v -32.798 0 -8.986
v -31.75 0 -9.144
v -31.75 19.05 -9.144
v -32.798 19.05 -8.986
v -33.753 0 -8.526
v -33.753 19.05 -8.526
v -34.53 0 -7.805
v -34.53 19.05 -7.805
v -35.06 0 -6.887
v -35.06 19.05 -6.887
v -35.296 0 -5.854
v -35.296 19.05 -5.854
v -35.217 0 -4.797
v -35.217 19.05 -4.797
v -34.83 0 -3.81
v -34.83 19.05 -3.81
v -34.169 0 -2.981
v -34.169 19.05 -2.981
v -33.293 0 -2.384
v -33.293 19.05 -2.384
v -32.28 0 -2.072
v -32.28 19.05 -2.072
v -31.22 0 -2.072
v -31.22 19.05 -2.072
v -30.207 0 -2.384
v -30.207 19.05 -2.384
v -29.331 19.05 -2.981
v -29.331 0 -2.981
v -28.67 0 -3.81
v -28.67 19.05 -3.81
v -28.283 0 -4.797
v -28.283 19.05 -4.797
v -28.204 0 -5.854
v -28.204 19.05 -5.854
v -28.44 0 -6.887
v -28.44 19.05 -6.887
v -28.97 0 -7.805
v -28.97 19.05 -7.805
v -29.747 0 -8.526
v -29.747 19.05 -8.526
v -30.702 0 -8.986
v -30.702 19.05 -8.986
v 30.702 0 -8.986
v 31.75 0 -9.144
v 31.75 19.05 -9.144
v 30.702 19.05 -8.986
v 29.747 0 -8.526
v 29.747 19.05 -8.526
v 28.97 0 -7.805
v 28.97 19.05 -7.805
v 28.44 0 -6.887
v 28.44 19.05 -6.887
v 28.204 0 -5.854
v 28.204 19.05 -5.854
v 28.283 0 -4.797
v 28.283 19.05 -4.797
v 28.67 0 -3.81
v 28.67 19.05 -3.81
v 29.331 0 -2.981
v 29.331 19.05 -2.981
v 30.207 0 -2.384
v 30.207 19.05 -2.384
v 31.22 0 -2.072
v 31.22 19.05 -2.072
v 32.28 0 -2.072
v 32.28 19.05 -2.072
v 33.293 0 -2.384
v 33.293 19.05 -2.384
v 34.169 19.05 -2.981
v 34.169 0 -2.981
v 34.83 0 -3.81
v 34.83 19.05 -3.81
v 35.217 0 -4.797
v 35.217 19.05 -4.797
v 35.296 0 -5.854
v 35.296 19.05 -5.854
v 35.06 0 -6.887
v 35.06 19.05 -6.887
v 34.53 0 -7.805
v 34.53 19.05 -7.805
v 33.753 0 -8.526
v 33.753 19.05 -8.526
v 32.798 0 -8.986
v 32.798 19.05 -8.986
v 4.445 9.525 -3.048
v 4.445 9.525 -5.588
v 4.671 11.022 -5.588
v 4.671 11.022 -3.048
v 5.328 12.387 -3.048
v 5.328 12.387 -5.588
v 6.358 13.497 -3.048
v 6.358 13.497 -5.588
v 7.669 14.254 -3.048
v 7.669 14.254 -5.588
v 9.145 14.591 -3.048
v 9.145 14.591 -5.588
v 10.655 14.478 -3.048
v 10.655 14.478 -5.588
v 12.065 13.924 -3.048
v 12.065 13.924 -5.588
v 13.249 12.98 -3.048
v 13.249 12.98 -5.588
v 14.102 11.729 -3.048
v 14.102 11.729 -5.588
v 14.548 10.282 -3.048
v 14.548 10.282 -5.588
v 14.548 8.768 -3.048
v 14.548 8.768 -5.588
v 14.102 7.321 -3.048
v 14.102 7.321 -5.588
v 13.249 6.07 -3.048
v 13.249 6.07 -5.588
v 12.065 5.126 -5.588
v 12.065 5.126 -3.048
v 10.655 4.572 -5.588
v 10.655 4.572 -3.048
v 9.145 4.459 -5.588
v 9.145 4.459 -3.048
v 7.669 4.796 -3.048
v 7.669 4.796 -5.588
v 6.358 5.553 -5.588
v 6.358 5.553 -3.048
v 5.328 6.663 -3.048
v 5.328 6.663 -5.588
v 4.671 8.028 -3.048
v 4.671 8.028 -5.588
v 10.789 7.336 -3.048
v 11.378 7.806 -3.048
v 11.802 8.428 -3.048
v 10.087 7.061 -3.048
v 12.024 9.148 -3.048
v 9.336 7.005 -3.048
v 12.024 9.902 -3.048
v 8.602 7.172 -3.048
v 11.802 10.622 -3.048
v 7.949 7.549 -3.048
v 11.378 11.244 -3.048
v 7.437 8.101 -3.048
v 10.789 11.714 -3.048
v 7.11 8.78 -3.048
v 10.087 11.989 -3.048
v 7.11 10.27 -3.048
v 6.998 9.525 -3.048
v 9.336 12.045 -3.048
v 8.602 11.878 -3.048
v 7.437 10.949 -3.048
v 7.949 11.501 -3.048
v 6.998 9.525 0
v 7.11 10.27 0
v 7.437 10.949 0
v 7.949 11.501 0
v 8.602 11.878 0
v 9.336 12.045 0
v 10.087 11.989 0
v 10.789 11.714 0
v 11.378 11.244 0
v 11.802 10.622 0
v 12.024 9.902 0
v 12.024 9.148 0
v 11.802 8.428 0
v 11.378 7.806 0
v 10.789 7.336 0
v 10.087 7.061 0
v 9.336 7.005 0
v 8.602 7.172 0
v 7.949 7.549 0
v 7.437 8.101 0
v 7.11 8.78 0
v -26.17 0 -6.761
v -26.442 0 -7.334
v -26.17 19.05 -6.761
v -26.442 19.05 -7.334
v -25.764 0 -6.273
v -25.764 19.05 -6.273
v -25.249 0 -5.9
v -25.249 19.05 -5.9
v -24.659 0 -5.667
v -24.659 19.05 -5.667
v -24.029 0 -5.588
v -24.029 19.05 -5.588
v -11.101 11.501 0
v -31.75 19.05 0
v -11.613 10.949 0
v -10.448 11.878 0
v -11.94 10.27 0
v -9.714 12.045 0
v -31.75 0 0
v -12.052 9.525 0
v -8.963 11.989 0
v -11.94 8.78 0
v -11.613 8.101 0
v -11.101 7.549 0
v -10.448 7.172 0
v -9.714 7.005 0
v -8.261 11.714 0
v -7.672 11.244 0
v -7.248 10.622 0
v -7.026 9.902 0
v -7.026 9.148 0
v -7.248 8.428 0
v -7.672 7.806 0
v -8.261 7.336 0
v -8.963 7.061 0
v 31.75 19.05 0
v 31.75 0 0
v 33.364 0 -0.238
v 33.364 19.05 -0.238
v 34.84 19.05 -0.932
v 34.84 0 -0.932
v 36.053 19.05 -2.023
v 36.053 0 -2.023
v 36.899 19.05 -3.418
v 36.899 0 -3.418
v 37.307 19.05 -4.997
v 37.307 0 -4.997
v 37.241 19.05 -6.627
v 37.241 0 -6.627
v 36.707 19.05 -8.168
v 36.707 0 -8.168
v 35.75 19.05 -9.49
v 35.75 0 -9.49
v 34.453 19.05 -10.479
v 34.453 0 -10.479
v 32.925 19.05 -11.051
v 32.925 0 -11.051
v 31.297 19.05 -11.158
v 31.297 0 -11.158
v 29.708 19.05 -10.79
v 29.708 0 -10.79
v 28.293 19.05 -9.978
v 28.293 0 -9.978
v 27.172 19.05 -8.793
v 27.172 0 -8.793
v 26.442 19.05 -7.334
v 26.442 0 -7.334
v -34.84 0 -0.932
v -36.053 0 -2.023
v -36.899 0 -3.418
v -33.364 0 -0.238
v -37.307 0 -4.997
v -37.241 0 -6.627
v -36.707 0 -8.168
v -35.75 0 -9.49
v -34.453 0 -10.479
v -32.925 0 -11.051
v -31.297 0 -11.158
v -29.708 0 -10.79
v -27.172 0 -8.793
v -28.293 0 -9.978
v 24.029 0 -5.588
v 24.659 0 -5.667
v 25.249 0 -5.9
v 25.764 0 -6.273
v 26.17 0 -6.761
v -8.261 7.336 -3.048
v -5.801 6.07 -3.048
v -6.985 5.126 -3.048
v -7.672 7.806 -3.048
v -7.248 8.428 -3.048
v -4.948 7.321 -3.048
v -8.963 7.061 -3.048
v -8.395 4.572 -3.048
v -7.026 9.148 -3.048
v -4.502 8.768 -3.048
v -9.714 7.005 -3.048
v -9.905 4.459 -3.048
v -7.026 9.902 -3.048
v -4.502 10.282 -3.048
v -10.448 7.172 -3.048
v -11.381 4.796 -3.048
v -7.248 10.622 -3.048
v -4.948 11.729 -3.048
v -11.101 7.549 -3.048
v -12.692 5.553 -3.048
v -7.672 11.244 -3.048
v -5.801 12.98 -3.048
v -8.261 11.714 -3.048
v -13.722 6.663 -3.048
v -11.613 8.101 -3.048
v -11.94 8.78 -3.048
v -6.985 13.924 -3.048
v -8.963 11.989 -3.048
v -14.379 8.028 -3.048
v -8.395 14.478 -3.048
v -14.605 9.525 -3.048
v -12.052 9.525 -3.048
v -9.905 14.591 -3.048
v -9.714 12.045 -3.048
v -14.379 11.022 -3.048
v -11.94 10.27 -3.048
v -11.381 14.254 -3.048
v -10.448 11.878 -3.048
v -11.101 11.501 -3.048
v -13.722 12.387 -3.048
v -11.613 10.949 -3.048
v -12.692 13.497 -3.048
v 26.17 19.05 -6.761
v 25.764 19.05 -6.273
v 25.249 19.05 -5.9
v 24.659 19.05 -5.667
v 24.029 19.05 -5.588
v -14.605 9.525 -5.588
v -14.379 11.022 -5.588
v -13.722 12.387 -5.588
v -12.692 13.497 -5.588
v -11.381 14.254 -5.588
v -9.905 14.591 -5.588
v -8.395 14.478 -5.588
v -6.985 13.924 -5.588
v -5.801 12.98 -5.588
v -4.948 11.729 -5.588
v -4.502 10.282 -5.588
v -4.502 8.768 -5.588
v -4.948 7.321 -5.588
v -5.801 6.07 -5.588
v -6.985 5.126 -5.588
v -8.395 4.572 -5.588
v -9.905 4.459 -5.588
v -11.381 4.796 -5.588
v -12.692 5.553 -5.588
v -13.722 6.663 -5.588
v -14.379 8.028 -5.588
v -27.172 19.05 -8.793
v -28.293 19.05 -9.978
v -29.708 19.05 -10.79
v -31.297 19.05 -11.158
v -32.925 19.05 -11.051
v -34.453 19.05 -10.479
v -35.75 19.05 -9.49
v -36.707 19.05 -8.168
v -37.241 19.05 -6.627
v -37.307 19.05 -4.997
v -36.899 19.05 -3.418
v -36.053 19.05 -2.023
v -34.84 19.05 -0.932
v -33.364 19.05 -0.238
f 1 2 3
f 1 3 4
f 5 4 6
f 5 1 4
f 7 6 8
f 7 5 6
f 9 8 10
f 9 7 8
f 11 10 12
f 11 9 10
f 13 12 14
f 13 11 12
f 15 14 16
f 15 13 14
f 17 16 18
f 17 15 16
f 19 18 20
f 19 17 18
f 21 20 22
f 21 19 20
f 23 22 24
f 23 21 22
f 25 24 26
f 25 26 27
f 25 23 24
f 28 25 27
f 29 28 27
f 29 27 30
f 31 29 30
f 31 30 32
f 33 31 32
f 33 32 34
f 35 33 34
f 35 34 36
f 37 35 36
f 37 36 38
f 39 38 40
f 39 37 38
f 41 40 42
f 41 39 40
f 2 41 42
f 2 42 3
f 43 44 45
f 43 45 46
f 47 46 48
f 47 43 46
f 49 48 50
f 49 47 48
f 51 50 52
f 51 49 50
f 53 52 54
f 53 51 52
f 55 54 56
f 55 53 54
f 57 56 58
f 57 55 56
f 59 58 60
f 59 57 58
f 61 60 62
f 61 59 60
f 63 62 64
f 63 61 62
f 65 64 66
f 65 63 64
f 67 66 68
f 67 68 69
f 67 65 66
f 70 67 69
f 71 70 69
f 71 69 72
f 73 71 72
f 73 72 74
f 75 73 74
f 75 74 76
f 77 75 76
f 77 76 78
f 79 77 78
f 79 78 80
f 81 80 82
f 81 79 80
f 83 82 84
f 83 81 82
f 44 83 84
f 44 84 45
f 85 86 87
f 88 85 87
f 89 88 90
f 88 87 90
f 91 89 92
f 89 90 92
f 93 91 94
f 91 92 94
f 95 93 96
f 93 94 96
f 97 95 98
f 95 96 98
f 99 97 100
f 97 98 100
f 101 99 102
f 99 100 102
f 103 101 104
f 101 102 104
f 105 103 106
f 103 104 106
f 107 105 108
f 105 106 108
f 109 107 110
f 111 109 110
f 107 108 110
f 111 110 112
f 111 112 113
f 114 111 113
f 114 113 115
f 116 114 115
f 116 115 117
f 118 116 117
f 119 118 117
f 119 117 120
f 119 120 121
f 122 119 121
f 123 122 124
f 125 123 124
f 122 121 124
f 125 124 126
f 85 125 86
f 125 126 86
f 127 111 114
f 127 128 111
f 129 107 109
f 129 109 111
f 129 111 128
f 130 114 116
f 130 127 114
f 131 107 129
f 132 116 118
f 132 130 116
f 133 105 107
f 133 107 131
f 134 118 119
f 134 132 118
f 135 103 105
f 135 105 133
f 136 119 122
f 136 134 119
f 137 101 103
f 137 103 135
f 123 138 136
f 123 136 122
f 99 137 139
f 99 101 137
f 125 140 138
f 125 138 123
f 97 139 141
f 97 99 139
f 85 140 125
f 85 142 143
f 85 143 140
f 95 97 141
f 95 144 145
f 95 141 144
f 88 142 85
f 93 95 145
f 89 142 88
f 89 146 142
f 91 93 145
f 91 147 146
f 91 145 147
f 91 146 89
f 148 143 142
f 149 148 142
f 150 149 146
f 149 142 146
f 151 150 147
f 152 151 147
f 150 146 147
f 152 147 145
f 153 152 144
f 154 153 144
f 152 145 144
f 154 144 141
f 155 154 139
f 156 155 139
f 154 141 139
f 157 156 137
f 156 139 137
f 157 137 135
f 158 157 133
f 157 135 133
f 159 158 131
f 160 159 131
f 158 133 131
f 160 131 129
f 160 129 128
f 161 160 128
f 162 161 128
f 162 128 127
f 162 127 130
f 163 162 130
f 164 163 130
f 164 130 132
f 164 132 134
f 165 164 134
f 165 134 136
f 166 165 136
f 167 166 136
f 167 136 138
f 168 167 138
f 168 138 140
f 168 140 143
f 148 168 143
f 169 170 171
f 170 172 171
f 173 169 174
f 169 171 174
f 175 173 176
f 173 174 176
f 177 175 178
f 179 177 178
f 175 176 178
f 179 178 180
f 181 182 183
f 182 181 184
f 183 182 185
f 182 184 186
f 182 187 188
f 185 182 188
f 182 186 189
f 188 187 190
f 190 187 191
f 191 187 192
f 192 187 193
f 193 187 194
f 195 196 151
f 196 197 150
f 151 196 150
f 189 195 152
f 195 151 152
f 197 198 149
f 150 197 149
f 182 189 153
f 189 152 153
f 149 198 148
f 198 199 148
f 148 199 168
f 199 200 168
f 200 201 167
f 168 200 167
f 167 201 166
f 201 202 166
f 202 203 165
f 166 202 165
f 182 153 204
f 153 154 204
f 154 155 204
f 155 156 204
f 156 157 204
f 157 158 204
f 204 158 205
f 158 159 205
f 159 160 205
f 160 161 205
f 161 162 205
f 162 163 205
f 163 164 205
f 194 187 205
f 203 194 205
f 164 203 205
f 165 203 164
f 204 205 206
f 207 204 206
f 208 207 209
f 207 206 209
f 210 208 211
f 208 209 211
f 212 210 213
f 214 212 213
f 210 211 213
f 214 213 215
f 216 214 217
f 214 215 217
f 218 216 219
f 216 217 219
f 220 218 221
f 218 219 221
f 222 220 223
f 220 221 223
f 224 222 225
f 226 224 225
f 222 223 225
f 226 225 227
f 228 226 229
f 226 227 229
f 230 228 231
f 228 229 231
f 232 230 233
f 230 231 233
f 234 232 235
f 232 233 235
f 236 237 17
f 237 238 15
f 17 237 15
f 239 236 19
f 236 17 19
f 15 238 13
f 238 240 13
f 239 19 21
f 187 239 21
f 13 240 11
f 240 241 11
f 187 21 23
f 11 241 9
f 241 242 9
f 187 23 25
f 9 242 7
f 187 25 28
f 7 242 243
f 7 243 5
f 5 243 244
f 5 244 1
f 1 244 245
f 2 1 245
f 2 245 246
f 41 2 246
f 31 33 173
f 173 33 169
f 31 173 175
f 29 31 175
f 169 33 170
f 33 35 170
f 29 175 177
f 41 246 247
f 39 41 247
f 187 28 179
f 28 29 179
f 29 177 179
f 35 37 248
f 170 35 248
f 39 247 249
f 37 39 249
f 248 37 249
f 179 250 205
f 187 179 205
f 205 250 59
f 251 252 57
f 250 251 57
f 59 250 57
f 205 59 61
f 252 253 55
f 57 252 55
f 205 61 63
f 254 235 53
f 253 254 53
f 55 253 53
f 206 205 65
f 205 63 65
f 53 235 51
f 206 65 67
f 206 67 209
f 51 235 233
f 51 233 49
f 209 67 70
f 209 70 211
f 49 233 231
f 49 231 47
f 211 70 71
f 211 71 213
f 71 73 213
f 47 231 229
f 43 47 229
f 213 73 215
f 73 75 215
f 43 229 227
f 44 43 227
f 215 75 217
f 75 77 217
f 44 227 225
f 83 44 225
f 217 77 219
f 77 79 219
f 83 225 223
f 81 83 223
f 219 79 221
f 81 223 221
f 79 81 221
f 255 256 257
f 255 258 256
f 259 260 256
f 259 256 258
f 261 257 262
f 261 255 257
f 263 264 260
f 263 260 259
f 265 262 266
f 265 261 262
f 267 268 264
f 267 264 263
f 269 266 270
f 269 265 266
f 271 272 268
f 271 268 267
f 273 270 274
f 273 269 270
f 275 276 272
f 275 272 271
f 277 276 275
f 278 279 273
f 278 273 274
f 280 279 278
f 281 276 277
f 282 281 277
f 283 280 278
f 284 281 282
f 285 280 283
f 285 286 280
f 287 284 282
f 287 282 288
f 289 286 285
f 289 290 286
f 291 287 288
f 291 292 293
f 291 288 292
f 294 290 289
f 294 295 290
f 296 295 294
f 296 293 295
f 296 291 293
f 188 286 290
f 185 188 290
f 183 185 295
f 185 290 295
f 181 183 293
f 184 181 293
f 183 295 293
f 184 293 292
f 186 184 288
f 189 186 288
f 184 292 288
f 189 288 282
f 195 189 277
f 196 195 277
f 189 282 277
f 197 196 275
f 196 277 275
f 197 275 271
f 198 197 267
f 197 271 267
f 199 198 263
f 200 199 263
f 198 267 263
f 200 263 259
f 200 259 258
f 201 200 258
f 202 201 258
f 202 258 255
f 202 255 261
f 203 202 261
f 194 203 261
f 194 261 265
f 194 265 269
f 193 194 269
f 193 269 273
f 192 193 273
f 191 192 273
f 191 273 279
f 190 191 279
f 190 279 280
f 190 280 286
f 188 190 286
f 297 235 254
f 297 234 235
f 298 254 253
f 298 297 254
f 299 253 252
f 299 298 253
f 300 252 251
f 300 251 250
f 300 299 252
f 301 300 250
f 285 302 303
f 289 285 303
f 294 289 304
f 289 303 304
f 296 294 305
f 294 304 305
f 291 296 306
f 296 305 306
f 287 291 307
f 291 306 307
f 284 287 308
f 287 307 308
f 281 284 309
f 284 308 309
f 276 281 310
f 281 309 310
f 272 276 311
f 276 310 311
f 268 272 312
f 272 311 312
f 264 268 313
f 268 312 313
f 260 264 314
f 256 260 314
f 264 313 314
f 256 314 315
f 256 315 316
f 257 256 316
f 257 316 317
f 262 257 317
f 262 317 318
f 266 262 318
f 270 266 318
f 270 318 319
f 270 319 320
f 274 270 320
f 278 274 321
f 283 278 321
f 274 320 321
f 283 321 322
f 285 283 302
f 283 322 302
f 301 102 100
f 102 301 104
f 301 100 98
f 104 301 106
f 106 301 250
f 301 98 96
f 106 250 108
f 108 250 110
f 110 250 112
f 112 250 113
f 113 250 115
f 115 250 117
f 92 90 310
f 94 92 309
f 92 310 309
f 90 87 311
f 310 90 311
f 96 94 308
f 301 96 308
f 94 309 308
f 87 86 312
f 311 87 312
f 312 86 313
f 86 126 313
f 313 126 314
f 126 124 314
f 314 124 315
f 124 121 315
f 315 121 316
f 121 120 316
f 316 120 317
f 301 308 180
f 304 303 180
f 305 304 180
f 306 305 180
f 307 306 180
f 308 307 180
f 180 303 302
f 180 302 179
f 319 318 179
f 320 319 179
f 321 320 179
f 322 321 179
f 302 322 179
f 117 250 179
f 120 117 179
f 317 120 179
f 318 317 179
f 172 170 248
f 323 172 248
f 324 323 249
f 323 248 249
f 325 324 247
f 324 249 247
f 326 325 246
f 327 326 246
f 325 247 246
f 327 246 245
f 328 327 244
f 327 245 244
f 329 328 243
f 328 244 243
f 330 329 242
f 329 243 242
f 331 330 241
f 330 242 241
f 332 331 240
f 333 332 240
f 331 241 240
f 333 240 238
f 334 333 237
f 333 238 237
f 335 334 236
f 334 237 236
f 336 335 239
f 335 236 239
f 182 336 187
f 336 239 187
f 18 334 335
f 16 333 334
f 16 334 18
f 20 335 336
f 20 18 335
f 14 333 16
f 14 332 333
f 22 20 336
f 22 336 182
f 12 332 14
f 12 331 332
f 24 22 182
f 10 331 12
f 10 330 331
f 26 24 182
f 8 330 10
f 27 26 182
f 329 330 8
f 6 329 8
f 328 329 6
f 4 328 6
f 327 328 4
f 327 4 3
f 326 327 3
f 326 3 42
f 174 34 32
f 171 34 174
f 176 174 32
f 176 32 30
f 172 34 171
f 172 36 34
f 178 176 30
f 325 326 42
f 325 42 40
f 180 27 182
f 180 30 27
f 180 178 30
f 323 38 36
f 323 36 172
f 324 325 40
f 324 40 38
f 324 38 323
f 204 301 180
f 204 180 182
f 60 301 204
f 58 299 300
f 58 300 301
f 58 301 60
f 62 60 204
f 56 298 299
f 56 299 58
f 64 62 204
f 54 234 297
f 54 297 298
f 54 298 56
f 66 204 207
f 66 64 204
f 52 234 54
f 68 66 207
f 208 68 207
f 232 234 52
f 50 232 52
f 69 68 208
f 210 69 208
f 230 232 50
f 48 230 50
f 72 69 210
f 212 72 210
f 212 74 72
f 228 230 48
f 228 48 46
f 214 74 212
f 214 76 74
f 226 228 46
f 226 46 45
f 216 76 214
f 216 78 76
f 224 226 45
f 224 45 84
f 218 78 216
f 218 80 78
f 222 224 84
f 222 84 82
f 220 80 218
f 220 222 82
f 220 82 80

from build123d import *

# Parameters (mm, degrees)
SKETCH1_R                      = 3.556
BOSS_EXTRUDE1_DEPTH            = 19.05
FILLET2_R                      = 2.54
F_8_0_199_DIAMETER_HOLE1_D     = 5.0546
F_8_0_199_DIAMETER_HOLE1_DEPTH = 9.149444958
F_8_0_199_DIAMETER_HOLE1_TIP   = 1.518555042
SKETCH11_R                     = 5.08
CUT_EXTRUDE1_DEPTH             = 2.54


with BuildPart() as part:
    # Sketch1 → Boss-Extrude1 (new body)
    with BuildSketch(Plane(origin=(0, 0, 0), x_dir=(1, 0, 0), z_dir=(0, 1, 0))):
        with BuildLine():
            Line((-31.75, 0), (31.75, 0))
            ThreePointArc((31.75, 0), (35.701312693, 9.539312693), (26.162, 5.588))
            Line((26.162, 5.588), (-26.162, 5.588))
            ThreePointArc((-26.162, 5.588), (-35.701312693, 9.539312693), (-31.75, 0))
        make_face()
        with Locations(Location((31.75, 5.588, 0), (0, 0, 90))):
            Circle(SKETCH1_R, mode=Mode.SUBTRACT)
        with Locations(Location((-31.75, 5.588, 0), (0, 0, 90))):
            Circle(SKETCH1_R, mode=Mode.SUBTRACT)
    extrude(amount=BOSS_EXTRUDE1_DEPTH)

    # Fillet2
    fillet2_edges = [part.edges().sort_by_distance(p)[0] for p in [
        (-26.162, 9.525, -5.588),
        (26.162, 9.525, -5.588),
    ]]
    fillet(fillet2_edges, radius=FILLET2_R)

    # #8 (0.199) Diameter Hole1
    with Locations(Plane.XY):
        with Locations((-9.525, 9.525), (9.525, 9.525)):
            Hole(F_8_0_199_DIAMETER_HOLE1_D / 2, depth=F_8_0_199_DIAMETER_HOLE1_DEPTH)
            with Locations((0, 0, -(F_8_0_199_DIAMETER_HOLE1_DEPTH + F_8_0_199_DIAMETER_HOLE1_TIP / 2))):  # 118° drill point
                Cone(0, F_8_0_199_DIAMETER_HOLE1_D / 2, F_8_0_199_DIAMETER_HOLE1_TIP, mode=Mode.SUBTRACT)

    # Sketch11 → Cut-Extrude1 (cut)
    with BuildSketch(Plane(origin=(0, 0, -5.588), x_dir=(-1, 0, 0), z_dir=(0, 0, -1))):
        with Locations((-9.525, 9.525)):
            Circle(SKETCH11_R)
        with Locations((9.525, 9.525)):
            Circle(SKETCH11_R)
    extrude(amount=-CUT_EXTRUDE1_DEPTH, mode=Mode.SUBTRACT)


solid = part.part
